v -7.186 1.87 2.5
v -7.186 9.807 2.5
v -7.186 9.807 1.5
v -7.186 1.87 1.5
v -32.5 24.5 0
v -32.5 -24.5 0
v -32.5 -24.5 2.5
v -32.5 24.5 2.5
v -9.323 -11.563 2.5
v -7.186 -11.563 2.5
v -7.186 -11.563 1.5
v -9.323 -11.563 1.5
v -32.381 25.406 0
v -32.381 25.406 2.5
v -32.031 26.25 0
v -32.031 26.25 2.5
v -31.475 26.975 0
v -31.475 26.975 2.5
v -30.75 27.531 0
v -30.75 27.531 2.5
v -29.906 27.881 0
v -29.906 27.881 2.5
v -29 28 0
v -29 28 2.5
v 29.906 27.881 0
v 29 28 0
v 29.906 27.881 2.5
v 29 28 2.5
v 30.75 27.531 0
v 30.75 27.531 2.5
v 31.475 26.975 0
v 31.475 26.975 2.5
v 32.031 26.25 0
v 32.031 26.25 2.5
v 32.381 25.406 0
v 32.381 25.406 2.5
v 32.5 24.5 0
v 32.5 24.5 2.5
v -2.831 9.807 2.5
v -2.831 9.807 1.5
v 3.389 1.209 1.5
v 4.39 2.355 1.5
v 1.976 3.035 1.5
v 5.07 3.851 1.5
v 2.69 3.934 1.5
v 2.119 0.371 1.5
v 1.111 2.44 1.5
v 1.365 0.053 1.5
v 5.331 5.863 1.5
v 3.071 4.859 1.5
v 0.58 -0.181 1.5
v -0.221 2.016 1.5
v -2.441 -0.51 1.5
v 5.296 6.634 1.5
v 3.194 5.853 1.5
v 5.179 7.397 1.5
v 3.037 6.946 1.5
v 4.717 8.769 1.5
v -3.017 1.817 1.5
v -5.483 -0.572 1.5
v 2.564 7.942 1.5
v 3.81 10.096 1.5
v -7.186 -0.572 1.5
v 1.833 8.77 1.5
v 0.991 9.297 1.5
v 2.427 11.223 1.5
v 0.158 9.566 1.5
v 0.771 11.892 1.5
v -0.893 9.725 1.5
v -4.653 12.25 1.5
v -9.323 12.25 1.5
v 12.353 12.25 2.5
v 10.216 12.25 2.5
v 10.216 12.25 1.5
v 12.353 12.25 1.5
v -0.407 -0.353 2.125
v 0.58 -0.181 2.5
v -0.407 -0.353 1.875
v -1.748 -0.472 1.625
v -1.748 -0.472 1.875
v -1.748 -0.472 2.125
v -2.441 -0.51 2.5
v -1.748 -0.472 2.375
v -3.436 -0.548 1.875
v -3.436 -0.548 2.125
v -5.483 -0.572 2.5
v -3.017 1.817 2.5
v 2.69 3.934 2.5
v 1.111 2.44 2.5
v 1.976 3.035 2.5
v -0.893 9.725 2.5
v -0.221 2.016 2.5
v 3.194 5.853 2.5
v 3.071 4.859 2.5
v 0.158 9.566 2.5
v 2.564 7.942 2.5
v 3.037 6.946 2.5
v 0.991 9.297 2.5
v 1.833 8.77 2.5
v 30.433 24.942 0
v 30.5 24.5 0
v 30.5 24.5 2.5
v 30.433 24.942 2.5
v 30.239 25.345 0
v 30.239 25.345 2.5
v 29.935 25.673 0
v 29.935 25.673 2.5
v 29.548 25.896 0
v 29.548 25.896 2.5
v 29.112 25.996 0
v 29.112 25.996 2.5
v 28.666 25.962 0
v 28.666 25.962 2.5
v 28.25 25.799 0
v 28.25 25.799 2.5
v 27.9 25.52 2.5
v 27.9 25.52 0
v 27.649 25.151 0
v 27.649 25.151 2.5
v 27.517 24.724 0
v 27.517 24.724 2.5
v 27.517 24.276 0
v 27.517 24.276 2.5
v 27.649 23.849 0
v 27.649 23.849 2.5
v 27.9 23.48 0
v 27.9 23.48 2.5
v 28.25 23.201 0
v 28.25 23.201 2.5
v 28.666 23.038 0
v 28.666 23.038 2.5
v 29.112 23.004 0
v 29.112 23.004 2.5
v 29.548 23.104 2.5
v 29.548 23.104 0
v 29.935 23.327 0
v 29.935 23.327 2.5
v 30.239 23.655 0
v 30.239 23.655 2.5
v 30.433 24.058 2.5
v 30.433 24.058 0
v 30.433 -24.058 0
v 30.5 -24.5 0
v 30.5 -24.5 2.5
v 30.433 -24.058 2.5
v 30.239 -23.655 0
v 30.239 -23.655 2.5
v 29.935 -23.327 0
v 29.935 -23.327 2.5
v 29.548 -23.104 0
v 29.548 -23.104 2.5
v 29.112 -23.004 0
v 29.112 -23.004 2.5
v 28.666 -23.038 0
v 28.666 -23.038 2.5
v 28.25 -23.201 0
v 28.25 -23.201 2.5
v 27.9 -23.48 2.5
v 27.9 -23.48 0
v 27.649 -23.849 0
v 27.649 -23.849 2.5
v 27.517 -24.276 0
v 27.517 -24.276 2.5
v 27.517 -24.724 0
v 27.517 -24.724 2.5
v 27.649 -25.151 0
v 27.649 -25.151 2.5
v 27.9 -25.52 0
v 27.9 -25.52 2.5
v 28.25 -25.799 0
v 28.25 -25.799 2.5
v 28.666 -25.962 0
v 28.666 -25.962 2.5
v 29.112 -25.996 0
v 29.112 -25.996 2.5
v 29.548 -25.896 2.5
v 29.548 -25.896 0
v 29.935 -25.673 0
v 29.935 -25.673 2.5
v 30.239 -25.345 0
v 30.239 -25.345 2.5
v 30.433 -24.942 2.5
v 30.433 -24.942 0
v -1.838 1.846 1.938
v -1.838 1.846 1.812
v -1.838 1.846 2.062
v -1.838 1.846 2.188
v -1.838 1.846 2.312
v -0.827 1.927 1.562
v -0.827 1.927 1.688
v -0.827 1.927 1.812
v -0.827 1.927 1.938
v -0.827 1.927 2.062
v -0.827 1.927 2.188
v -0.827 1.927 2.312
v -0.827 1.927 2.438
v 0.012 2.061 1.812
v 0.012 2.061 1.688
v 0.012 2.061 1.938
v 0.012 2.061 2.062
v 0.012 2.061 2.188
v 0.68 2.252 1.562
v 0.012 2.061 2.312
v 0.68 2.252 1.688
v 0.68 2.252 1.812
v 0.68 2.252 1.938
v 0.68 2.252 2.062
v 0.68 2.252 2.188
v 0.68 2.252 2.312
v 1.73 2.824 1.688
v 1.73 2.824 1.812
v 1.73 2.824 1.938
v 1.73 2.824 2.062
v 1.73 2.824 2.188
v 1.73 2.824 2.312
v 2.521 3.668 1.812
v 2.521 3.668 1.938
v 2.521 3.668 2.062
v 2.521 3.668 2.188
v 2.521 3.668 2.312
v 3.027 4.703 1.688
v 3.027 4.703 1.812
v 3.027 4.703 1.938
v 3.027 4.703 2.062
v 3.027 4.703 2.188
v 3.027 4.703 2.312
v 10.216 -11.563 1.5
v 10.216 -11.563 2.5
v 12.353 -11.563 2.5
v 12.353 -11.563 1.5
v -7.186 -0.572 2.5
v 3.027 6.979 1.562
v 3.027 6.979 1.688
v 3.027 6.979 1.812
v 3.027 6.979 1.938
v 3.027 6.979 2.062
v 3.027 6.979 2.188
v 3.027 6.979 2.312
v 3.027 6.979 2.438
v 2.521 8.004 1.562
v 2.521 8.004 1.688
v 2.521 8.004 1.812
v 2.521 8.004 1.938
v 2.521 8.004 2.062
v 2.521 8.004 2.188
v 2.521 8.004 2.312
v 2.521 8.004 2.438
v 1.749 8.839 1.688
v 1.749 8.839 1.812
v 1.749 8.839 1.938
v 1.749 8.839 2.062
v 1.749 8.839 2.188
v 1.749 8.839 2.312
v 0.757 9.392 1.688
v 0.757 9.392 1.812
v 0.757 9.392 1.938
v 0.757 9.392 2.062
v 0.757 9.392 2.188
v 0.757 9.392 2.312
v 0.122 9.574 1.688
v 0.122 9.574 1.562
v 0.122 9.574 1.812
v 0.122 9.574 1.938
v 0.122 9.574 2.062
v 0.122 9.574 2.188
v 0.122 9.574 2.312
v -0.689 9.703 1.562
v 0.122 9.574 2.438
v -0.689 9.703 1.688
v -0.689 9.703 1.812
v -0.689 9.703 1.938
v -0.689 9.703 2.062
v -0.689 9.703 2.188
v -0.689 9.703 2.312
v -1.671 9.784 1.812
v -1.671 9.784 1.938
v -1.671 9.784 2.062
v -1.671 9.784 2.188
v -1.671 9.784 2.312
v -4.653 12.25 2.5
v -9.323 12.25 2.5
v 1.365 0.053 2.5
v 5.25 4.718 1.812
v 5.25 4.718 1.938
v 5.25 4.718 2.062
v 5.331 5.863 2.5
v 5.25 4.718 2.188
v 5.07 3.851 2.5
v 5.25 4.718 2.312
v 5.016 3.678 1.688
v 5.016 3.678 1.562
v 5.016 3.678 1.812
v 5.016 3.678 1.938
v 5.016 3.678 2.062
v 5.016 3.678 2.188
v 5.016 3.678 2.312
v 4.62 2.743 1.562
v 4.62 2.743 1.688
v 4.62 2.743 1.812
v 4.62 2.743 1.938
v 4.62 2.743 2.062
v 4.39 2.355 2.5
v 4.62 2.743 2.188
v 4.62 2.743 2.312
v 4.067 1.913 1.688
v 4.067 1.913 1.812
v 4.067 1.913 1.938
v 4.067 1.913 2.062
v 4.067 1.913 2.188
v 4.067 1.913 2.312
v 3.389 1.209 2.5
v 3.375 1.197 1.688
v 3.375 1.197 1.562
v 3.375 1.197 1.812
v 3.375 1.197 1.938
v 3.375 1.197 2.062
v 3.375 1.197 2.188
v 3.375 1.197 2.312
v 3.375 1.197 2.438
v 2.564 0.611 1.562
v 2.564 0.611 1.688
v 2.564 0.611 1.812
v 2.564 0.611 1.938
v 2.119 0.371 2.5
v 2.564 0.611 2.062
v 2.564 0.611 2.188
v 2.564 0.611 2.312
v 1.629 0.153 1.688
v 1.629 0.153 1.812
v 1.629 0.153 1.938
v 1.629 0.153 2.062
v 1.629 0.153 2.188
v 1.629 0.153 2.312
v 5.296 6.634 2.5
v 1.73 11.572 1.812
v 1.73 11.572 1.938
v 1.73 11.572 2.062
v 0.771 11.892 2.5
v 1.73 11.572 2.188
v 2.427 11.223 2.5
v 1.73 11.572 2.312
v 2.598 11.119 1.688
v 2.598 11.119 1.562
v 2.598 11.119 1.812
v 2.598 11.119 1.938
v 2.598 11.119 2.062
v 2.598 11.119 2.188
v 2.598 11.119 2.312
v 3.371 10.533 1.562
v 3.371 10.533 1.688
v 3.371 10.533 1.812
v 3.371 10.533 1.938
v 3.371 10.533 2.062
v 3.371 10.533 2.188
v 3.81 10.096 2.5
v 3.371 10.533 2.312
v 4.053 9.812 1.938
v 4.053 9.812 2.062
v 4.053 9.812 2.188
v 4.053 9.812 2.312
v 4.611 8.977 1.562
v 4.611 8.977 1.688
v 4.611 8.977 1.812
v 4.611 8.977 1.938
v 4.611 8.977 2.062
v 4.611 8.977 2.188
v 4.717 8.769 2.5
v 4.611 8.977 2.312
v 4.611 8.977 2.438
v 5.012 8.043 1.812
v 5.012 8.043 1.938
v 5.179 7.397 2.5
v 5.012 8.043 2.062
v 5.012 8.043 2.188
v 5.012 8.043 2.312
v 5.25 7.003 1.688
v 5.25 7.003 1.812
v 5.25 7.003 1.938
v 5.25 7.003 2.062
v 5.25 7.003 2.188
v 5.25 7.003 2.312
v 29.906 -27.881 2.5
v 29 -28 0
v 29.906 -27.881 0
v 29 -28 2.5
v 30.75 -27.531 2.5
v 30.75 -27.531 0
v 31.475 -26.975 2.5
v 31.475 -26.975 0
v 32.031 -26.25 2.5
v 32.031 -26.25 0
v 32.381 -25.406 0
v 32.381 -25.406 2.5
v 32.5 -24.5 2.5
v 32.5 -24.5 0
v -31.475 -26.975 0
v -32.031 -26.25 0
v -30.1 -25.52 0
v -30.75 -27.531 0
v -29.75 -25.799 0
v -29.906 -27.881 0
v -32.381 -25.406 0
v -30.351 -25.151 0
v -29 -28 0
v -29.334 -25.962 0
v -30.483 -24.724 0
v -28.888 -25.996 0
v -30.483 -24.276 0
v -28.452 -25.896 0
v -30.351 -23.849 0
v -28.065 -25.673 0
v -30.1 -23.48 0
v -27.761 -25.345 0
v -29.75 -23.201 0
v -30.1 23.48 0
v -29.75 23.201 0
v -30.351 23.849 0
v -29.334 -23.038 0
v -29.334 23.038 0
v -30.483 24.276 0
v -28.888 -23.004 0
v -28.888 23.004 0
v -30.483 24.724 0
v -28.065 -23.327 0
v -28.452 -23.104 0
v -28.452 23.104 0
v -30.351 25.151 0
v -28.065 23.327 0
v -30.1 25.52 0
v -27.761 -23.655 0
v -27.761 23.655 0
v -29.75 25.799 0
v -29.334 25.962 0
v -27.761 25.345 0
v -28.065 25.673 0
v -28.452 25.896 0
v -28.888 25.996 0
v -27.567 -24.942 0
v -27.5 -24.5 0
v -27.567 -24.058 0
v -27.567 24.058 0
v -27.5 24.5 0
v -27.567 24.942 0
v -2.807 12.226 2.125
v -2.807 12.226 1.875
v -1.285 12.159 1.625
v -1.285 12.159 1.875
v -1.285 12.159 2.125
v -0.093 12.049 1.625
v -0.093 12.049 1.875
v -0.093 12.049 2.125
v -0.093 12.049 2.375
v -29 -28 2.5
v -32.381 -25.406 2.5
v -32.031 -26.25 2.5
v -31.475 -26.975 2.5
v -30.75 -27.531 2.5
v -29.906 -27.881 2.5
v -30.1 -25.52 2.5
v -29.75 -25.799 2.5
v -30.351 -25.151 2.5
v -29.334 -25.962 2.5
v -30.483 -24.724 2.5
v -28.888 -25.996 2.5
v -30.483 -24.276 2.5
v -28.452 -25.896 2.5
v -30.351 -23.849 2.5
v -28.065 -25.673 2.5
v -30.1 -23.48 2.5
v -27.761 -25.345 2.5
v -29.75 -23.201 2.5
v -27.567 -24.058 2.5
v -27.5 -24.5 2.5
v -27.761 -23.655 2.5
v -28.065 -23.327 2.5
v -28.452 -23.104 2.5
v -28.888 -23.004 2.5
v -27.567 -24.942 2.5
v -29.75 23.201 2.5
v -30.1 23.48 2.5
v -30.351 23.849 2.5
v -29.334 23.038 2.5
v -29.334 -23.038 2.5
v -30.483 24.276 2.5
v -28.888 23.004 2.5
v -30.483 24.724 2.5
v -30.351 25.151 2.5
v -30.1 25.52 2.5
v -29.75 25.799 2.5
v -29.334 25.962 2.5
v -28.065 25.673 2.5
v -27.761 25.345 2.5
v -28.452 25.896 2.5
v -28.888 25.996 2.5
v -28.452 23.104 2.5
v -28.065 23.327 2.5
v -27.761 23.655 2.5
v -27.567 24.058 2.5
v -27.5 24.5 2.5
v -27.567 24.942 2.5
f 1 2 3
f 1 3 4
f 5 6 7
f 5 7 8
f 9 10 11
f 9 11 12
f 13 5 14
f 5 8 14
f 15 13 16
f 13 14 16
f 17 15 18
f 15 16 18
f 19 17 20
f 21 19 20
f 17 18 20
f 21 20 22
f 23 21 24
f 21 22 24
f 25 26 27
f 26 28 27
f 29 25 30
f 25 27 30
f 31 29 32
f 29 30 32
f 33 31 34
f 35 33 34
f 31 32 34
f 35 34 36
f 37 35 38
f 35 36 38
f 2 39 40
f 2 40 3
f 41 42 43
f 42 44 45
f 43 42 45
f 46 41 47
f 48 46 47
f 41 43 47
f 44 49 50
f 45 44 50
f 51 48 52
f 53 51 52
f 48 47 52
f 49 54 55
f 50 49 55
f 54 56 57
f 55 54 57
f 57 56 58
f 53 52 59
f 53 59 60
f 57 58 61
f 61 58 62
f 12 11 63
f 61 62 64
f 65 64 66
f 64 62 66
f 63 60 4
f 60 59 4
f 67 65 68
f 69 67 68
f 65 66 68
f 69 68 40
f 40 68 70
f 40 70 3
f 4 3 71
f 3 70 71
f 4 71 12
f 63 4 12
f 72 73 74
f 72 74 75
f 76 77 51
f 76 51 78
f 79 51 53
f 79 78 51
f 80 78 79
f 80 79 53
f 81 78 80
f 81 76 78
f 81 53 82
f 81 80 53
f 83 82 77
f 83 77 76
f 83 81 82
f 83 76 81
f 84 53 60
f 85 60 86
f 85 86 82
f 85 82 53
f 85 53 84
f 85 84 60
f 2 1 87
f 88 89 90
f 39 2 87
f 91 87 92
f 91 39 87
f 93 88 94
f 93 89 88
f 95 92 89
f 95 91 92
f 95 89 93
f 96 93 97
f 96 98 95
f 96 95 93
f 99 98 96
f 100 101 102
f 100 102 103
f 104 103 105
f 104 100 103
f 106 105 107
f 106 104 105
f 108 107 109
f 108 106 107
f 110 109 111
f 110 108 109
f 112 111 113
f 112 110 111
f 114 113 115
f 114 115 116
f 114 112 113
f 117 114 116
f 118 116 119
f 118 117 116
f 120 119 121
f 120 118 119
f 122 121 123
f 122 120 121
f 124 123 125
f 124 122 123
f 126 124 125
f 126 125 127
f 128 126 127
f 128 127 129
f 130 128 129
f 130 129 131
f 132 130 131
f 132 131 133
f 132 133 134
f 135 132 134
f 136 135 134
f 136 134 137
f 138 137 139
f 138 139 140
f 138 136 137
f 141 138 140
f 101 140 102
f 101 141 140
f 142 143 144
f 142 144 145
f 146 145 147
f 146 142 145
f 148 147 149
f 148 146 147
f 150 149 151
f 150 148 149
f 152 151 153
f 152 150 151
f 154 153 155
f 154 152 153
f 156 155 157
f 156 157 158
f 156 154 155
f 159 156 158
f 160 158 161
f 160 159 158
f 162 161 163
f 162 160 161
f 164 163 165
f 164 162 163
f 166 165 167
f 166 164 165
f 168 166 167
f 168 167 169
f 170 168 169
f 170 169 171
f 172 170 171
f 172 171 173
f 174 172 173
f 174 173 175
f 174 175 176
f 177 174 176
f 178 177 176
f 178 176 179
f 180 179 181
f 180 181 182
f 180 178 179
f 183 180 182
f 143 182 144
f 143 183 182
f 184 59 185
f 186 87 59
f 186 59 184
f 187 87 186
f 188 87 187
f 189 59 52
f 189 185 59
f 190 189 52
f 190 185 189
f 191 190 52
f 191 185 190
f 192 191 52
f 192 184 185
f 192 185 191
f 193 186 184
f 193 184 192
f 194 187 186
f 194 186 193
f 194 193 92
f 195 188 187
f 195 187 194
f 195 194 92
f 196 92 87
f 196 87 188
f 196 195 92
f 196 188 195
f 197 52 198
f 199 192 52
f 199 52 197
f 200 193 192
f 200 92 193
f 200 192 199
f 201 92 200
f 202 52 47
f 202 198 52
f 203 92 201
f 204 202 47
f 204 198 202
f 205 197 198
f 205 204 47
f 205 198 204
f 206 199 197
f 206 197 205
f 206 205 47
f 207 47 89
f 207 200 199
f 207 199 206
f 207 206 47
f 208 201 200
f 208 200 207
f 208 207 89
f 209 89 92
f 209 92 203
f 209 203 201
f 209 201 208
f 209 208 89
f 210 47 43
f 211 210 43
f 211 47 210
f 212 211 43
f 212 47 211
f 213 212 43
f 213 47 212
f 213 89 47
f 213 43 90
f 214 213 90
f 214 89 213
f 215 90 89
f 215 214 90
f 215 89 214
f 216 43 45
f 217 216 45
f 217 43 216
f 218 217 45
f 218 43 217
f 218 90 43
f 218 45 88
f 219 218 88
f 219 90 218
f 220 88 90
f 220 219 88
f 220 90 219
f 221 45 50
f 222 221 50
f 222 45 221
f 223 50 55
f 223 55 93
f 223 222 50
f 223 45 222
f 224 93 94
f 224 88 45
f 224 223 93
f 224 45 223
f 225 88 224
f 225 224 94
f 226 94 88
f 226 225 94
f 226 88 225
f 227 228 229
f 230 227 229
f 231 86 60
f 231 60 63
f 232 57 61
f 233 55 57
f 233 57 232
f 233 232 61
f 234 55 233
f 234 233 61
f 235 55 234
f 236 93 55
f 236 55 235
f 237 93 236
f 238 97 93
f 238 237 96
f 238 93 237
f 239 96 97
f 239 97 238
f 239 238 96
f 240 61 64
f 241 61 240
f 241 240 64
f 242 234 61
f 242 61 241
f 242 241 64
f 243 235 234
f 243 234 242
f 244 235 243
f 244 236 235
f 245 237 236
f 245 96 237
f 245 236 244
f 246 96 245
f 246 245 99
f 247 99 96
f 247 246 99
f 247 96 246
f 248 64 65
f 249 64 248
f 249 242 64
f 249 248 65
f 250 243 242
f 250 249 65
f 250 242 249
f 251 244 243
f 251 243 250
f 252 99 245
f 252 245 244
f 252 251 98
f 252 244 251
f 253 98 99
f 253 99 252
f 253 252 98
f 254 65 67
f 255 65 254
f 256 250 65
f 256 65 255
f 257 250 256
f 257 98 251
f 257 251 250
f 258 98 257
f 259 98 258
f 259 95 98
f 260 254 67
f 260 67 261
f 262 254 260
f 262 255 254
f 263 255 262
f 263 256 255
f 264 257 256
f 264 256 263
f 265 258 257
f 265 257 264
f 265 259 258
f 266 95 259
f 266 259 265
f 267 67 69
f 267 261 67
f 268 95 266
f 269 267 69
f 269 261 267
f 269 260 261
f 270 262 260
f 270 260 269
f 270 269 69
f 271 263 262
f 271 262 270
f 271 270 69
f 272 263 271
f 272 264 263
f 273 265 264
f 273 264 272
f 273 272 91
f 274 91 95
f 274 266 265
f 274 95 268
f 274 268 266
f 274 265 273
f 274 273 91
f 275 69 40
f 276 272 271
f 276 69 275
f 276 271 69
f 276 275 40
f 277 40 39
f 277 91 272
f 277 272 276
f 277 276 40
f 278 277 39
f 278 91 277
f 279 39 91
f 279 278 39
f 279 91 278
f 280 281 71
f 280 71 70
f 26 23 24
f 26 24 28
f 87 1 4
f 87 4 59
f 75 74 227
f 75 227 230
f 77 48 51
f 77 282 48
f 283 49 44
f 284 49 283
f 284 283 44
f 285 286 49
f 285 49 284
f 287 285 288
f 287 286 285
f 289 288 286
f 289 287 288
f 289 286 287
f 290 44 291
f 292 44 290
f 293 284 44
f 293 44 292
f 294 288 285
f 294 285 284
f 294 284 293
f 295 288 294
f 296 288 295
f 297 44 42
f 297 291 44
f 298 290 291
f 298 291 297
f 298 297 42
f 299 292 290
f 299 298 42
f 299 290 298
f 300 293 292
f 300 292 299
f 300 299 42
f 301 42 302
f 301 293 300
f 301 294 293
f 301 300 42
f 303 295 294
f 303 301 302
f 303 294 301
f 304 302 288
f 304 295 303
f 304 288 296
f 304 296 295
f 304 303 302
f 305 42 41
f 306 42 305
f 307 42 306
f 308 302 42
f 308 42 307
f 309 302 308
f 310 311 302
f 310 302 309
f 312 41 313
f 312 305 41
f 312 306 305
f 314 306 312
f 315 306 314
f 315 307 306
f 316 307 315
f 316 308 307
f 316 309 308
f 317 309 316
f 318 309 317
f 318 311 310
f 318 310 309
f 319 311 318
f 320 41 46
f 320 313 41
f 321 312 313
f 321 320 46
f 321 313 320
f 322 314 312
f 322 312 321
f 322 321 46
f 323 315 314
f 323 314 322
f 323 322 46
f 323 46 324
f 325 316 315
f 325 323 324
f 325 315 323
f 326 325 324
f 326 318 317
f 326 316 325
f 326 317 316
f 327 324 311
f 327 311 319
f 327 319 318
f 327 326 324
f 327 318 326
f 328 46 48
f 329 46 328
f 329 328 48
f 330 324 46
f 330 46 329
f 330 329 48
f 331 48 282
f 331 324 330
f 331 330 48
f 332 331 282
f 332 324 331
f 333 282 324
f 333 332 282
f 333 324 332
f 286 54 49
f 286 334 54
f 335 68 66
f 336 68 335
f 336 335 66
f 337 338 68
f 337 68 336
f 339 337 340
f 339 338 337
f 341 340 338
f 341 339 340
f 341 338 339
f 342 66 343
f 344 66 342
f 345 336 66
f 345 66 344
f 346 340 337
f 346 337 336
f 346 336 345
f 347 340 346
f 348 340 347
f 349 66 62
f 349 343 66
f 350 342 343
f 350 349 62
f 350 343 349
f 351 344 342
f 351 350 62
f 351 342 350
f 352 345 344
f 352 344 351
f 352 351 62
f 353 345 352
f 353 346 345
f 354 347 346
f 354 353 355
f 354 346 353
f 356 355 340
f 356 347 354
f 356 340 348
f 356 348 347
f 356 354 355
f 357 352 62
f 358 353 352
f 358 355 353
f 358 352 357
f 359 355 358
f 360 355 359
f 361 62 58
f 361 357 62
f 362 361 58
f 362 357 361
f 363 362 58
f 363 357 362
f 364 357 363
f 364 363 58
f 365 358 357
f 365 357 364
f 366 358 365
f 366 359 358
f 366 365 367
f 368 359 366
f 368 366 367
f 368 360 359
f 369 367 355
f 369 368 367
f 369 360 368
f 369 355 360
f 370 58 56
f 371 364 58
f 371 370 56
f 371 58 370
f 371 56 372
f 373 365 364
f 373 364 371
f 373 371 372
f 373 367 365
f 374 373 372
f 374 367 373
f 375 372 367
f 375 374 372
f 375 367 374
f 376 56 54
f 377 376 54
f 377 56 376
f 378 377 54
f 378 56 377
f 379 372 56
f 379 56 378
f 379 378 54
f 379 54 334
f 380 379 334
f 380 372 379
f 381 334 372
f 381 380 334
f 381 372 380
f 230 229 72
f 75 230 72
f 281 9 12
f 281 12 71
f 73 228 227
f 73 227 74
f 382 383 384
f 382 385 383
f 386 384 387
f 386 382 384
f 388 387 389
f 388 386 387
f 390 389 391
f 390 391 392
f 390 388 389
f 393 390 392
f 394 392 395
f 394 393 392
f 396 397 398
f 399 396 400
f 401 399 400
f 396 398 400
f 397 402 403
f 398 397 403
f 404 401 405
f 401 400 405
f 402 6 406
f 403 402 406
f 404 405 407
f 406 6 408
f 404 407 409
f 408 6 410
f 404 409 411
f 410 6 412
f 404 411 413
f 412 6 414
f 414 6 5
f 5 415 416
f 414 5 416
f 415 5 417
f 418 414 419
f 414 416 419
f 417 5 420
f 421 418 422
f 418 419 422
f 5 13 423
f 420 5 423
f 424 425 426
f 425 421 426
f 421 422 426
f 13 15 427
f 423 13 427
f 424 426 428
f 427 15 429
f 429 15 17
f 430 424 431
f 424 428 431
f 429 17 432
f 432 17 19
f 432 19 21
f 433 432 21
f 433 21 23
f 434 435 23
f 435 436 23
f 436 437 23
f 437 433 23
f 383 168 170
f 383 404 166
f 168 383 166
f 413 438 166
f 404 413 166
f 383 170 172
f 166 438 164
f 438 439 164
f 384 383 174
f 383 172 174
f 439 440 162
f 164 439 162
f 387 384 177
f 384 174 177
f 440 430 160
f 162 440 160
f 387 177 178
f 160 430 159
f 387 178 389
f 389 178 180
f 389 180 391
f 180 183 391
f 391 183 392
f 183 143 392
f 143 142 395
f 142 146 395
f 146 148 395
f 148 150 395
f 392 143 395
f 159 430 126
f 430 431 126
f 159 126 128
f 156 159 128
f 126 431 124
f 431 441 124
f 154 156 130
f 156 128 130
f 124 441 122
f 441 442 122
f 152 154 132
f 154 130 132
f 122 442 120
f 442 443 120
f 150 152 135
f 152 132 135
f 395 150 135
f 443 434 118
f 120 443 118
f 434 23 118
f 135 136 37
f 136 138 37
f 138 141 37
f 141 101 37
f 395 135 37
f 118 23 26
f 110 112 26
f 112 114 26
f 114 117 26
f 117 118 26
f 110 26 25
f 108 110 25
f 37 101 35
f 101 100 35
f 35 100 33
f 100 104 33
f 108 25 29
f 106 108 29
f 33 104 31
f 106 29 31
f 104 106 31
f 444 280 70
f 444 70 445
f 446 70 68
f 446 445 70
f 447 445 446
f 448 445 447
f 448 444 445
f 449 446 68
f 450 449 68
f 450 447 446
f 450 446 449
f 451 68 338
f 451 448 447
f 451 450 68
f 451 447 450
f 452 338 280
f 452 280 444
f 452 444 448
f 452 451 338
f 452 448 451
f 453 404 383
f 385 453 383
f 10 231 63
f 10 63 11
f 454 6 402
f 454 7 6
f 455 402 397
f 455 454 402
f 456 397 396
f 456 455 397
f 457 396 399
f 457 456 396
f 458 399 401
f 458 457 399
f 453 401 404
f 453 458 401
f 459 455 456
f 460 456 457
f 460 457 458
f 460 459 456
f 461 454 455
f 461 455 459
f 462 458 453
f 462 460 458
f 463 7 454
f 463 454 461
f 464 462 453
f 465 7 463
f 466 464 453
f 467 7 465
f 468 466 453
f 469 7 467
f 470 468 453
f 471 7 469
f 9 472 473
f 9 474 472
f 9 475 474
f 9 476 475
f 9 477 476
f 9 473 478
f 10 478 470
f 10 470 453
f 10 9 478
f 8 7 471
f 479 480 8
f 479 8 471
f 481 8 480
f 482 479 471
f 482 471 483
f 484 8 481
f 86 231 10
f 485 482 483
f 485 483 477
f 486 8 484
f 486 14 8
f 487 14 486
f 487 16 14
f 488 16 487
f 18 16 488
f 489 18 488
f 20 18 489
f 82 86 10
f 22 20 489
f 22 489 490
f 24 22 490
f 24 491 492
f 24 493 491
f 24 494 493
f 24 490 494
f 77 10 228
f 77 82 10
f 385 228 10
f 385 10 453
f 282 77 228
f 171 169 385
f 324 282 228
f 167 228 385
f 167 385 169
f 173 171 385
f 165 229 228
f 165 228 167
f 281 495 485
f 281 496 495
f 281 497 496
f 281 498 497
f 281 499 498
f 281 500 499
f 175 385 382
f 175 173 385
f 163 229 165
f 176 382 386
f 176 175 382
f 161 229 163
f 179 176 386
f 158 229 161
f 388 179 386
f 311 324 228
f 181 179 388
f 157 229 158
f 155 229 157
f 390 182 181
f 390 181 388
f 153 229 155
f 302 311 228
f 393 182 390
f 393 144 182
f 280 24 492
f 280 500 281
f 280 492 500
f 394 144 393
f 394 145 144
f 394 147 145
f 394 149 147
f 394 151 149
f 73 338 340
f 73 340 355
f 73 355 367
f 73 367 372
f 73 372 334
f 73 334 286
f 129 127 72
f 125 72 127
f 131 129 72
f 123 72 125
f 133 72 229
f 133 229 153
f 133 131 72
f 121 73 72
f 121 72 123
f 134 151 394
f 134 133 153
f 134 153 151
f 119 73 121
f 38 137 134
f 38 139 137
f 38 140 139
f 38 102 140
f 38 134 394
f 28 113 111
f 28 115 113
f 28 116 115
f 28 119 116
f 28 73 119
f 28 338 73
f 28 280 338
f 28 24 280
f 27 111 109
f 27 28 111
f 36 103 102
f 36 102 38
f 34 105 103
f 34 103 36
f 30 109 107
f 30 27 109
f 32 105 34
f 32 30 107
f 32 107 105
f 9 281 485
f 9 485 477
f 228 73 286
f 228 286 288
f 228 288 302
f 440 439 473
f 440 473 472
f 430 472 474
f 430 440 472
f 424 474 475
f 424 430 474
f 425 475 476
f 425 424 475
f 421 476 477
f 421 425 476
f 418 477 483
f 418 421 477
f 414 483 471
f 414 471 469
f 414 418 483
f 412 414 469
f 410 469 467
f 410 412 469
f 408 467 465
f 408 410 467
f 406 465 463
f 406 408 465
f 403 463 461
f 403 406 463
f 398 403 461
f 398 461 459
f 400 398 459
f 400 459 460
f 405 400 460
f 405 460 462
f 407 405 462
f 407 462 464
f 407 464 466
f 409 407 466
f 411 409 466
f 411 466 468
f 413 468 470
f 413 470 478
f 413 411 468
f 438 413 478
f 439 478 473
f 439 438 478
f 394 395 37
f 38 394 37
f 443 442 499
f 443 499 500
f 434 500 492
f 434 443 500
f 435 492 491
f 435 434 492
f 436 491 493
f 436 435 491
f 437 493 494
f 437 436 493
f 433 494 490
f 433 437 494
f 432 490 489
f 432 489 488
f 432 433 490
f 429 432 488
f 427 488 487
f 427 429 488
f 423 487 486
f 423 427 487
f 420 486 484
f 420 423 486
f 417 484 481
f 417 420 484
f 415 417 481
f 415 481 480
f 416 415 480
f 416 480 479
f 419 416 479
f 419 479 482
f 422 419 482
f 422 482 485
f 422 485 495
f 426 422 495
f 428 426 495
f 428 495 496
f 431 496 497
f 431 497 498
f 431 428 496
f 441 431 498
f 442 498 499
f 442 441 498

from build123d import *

# Parameters (mm, degrees)
BOSS_EXTRU_1_OUTLINE_W  = 65
BOSS_EXTRU_1_OUTLINE_H  = 56
BOSS_EXTRU_1_OUTLINE_R  = 1.5
BOSS_EXTRU_1_DEPTH      = 2.5
CONG_3_R                = 3.5
ESQUISSE2_W             = 2.137019231
ESQUISSE2_H             = 23.8125
ENL_V_MAT_EXTRU_1_DEPTH = 1


# Read off the part's stored shape, not the designer's step: Boss.-Extru.1
with BuildPart() as part:
    # Boss.-Extru.1 outline → Boss.-Extru.1 (new body)
    with BuildSketch(Plane.XY):
        Rectangle(BOSS_EXTRU_1_OUTLINE_W, BOSS_EXTRU_1_OUTLINE_H)
        with Locations((-29, -24.5)):
            Circle(BOSS_EXTRU_1_OUTLINE_R, mode=Mode.SUBTRACT)
        with Locations((29, -24.5)):
            Circle(BOSS_EXTRU_1_OUTLINE_R, mode=Mode.SUBTRACT)
        with Locations((-29, 24.5)):
            Circle(BOSS_EXTRU_1_OUTLINE_R, mode=Mode.SUBTRACT)
        with Locations((29, 24.5)):
            Circle(BOSS_EXTRU_1_OUTLINE_R, mode=Mode.SUBTRACT)
    extrude(amount=BOSS_EXTRU_1_DEPTH)

    # Congé3
    cong_3_edges = [part.edges().sort_by_distance(p)[0] for p in [
        (-32.5, 28, 1.25),
        (32.5, 28, 1.25),
        (32.5, -28, 1.25),
        (-32.5, -28, 1.25),
    ]]
    fillet(cong_3_edges, radius=CONG_3_R)

    # Esquisse2 → Enlèv. mat.-Extru.1 (cut)
    # profile 1 of 2: a face of its own
    with BuildSketch(Plane.XY.offset(2.5)):
        with BuildLine():
            Line((-9.322744099, 12.249768252), (-4.652784664, 12.249768252))
            add(Edge.make_bspline(
                [(-4.652784664, 12.249768252), (-4.331581892, 12.249415172), (-3.716143116, 12.248738655), (-2.833617469, 12.228227617), (-2.032090545, 12.20083173), (-1.313290632, 12.16285492), (-0.675006107, 12.117974548), (-0.120125194, 12.055027637), (0.355713573, 11.989303126), (0.640827095, 11.922482485), (0.77085566, 11.892008336)],
                knots=[0, 0, 0, 0, 1.415646017, 2.712440637, 3.8905458, 4.950247383, 5.884950622, 6.709939814, 7.411656543, 8, 8, 8, 8], degree=3))
            add(Edge.make_bspline(
                [(0.77085566, 11.892008336), (0.935458095, 11.846955427), (1.260784315, 11.757911225), (1.729557484, 11.579564285), (2.175557754, 11.368094554), (2.600315321, 11.127085249), (2.998610565, 10.846195964), (3.376385951, 10.536812958), (3.730307602, 10.191793179), (4.058385286, 9.815006359), (4.35968007, 9.412777789), (4.61909809, 8.979102974), (4.83631726, 8.521281785), (5.022621303, 8.039632667), (5.156709181, 7.530111002), (5.257721123, 6.996257119), (5.321835447, 6.438128245), (5.32797609, 6.056720932), (5.331102055, 5.86256122)],
                knots=[0, 0, 0, 0, 0.999701418, 1.975846123, 2.934577507, 3.890451536, 4.834027766, 5.787354733, 6.749476667, 7.726910423, 8.712836071, 9.690891519, 10.682875813, 11.679750201, 12.712814741, 13.765529915, 14.8625177, 16, 16, 16, 16], degree=3))
            add(Edge.make_bspline(
                [(5.331102055, 5.86256122), (5.328234861, 5.66676956), (5.322625004, 5.283689954), (5.25529492, 4.723260806), (5.164602009, 4.187694616), (5.025148849, 3.67817889), (4.842502395, 3.197739452), (4.628243964, 2.739034284), (4.369820302, 2.309867231), (4.072879586, 1.908680234), (3.742555345, 1.535096724), (3.380245177, 1.191823926), (2.987411776, 0.880871195), (2.56530359, 0.601541428), (2.109805511, 0.360312098), (1.627825859, 0.144249005), (1.11517528, -0.037209461), (0.760419961, -0.132663986), (0.580050372, -0.181196292)],
                knots=[0, 0, 0, 0, 1.121902311, 2.195077645, 3.232258892, 4.234102512, 5.217864754, 6.176164875, 7.132989551, 8.084763148, 9.034132444, 9.988522005, 10.94243251, 11.903244335, 12.886203696, 13.894208494, 14.929344452, 16, 16, 16, 16], degree=3))
            add(Edge.make_bspline(
                [(0.580050372, -0.181196292), (0.430866189, -0.212921216), (0.103920378, -0.282448234), (-0.434532786, -0.360066485), (-1.061450501, -0.426316947), (-1.775977084, -0.475990758), (-2.577471169, -0.518515586), (-3.466366331, -0.552316368), (-4.444407463, -0.570889123), (-5.126610034, -0.571847017), (-5.482787669, -0.572347133)],
                knots=[0, 0, 0, 0, 0.601384939, 1.31797006, 2.144135048, 3.087295005, 4.142315834, 5.309527816, 6.595305764, 8, 8, 8, 8], degree=3))
            Line((-5.482787669, -0.572347133), (-7.185724869, -0.572347133))
            Line((-7.185724869, -0.572347133), (-7.185724869, -11.562731748))
            Line((-7.185724869, -11.562731748), (-9.322744099, -11.562731748))
            Line((-9.322744099, -11.562731748), (-9.322744099, 12.249768252))
        make_face()
        with BuildLine():
            Line((-7.185724869, 9.807460559), (-7.185724869, 1.869960559))
            Line((-7.185724869, 1.869960559), (-3.016629316, 1.817489105))
            add(Edge.make_bspline(
                [(-3.016629316, 1.817489105), (-2.813066963, 1.817383897), (-2.420094039, 1.817180796), (-1.852429734, 1.844294549), (-1.325770119, 1.875594601), (-0.841732919, 1.921422938), (-0.400099936, 1.986201493), (-0.000134784, 2.051595639), (0.355061194, 2.146201766), (0.770753978, 2.273585505), (1.233963895, 2.490841336), (1.737887752, 2.806186124), (2.16495192, 3.208145942), (2.534510332, 3.660092437), (2.827784252, 4.162870443), (3.042477699, 4.700821602), (3.168623788, 5.268428935), (3.185538784, 5.656832166), (3.194082824, 5.853020956)],
                knots=[0, 0, 0, 0, 1.160613943, 2.240541288, 3.23993089, 4.169200891, 5.011653406, 5.7853311, 6.478053781, 7.106038997, 8.262395093, 9.384106736, 10.481365981, 11.59014053, 12.70357646, 13.786202915, 14.881775077, 16, 16, 16, 16], degree=3))
            add(Edge.make_bspline(
                [(3.194082824, 5.853020956), (3.185492318, 6.044463342), (3.168415456, 6.425027112), (3.041488959, 6.982775465), (2.828201662, 7.515057668), (2.532541618, 8.011535267), (2.173713573, 8.461855522), (1.756659113, 8.853041333), (1.28235996, 9.167513989), (0.841160389, 9.370486852), (0.449266605, 9.49441578), (0.108870592, 9.581126212), (-0.275467747, 9.650356676), (-0.703873532, 9.706414722), (-1.173026277, 9.754403449), (-1.686956598, 9.786965187), (-2.243717635, 9.806025094), (-2.630232412, 9.806970487), (-2.830594159, 9.807460559)],
                knots=[0, 0, 0, 0, 1.120700087, 2.227813068, 3.331159281, 4.466773991, 5.599788987, 6.693661531, 7.80175334, 8.91857717, 9.525282508, 10.207424825, 10.974604443, 11.810962634, 12.737642355, 13.736264703, 14.826523623, 16, 16, 16, 16], degree=3))
            Line((-2.830594159, 9.807460559), (-7.185724869, 9.807460559))
        make_face(mode=Mode.SUBTRACT)
    # profile 2 of 2: a face of its own
    with BuildSketch(Plane.XY.offset(2.5)):
        with Locations((11.284227055, 0.343518252)):
            Rectangle(ESQUISSE2_W, ESQUISSE2_H)
    extrude(amount=-ENL_V_MAT_EXTRU_1_DEPTH, mode=Mode.SUBTRACT)


solid = part.part
